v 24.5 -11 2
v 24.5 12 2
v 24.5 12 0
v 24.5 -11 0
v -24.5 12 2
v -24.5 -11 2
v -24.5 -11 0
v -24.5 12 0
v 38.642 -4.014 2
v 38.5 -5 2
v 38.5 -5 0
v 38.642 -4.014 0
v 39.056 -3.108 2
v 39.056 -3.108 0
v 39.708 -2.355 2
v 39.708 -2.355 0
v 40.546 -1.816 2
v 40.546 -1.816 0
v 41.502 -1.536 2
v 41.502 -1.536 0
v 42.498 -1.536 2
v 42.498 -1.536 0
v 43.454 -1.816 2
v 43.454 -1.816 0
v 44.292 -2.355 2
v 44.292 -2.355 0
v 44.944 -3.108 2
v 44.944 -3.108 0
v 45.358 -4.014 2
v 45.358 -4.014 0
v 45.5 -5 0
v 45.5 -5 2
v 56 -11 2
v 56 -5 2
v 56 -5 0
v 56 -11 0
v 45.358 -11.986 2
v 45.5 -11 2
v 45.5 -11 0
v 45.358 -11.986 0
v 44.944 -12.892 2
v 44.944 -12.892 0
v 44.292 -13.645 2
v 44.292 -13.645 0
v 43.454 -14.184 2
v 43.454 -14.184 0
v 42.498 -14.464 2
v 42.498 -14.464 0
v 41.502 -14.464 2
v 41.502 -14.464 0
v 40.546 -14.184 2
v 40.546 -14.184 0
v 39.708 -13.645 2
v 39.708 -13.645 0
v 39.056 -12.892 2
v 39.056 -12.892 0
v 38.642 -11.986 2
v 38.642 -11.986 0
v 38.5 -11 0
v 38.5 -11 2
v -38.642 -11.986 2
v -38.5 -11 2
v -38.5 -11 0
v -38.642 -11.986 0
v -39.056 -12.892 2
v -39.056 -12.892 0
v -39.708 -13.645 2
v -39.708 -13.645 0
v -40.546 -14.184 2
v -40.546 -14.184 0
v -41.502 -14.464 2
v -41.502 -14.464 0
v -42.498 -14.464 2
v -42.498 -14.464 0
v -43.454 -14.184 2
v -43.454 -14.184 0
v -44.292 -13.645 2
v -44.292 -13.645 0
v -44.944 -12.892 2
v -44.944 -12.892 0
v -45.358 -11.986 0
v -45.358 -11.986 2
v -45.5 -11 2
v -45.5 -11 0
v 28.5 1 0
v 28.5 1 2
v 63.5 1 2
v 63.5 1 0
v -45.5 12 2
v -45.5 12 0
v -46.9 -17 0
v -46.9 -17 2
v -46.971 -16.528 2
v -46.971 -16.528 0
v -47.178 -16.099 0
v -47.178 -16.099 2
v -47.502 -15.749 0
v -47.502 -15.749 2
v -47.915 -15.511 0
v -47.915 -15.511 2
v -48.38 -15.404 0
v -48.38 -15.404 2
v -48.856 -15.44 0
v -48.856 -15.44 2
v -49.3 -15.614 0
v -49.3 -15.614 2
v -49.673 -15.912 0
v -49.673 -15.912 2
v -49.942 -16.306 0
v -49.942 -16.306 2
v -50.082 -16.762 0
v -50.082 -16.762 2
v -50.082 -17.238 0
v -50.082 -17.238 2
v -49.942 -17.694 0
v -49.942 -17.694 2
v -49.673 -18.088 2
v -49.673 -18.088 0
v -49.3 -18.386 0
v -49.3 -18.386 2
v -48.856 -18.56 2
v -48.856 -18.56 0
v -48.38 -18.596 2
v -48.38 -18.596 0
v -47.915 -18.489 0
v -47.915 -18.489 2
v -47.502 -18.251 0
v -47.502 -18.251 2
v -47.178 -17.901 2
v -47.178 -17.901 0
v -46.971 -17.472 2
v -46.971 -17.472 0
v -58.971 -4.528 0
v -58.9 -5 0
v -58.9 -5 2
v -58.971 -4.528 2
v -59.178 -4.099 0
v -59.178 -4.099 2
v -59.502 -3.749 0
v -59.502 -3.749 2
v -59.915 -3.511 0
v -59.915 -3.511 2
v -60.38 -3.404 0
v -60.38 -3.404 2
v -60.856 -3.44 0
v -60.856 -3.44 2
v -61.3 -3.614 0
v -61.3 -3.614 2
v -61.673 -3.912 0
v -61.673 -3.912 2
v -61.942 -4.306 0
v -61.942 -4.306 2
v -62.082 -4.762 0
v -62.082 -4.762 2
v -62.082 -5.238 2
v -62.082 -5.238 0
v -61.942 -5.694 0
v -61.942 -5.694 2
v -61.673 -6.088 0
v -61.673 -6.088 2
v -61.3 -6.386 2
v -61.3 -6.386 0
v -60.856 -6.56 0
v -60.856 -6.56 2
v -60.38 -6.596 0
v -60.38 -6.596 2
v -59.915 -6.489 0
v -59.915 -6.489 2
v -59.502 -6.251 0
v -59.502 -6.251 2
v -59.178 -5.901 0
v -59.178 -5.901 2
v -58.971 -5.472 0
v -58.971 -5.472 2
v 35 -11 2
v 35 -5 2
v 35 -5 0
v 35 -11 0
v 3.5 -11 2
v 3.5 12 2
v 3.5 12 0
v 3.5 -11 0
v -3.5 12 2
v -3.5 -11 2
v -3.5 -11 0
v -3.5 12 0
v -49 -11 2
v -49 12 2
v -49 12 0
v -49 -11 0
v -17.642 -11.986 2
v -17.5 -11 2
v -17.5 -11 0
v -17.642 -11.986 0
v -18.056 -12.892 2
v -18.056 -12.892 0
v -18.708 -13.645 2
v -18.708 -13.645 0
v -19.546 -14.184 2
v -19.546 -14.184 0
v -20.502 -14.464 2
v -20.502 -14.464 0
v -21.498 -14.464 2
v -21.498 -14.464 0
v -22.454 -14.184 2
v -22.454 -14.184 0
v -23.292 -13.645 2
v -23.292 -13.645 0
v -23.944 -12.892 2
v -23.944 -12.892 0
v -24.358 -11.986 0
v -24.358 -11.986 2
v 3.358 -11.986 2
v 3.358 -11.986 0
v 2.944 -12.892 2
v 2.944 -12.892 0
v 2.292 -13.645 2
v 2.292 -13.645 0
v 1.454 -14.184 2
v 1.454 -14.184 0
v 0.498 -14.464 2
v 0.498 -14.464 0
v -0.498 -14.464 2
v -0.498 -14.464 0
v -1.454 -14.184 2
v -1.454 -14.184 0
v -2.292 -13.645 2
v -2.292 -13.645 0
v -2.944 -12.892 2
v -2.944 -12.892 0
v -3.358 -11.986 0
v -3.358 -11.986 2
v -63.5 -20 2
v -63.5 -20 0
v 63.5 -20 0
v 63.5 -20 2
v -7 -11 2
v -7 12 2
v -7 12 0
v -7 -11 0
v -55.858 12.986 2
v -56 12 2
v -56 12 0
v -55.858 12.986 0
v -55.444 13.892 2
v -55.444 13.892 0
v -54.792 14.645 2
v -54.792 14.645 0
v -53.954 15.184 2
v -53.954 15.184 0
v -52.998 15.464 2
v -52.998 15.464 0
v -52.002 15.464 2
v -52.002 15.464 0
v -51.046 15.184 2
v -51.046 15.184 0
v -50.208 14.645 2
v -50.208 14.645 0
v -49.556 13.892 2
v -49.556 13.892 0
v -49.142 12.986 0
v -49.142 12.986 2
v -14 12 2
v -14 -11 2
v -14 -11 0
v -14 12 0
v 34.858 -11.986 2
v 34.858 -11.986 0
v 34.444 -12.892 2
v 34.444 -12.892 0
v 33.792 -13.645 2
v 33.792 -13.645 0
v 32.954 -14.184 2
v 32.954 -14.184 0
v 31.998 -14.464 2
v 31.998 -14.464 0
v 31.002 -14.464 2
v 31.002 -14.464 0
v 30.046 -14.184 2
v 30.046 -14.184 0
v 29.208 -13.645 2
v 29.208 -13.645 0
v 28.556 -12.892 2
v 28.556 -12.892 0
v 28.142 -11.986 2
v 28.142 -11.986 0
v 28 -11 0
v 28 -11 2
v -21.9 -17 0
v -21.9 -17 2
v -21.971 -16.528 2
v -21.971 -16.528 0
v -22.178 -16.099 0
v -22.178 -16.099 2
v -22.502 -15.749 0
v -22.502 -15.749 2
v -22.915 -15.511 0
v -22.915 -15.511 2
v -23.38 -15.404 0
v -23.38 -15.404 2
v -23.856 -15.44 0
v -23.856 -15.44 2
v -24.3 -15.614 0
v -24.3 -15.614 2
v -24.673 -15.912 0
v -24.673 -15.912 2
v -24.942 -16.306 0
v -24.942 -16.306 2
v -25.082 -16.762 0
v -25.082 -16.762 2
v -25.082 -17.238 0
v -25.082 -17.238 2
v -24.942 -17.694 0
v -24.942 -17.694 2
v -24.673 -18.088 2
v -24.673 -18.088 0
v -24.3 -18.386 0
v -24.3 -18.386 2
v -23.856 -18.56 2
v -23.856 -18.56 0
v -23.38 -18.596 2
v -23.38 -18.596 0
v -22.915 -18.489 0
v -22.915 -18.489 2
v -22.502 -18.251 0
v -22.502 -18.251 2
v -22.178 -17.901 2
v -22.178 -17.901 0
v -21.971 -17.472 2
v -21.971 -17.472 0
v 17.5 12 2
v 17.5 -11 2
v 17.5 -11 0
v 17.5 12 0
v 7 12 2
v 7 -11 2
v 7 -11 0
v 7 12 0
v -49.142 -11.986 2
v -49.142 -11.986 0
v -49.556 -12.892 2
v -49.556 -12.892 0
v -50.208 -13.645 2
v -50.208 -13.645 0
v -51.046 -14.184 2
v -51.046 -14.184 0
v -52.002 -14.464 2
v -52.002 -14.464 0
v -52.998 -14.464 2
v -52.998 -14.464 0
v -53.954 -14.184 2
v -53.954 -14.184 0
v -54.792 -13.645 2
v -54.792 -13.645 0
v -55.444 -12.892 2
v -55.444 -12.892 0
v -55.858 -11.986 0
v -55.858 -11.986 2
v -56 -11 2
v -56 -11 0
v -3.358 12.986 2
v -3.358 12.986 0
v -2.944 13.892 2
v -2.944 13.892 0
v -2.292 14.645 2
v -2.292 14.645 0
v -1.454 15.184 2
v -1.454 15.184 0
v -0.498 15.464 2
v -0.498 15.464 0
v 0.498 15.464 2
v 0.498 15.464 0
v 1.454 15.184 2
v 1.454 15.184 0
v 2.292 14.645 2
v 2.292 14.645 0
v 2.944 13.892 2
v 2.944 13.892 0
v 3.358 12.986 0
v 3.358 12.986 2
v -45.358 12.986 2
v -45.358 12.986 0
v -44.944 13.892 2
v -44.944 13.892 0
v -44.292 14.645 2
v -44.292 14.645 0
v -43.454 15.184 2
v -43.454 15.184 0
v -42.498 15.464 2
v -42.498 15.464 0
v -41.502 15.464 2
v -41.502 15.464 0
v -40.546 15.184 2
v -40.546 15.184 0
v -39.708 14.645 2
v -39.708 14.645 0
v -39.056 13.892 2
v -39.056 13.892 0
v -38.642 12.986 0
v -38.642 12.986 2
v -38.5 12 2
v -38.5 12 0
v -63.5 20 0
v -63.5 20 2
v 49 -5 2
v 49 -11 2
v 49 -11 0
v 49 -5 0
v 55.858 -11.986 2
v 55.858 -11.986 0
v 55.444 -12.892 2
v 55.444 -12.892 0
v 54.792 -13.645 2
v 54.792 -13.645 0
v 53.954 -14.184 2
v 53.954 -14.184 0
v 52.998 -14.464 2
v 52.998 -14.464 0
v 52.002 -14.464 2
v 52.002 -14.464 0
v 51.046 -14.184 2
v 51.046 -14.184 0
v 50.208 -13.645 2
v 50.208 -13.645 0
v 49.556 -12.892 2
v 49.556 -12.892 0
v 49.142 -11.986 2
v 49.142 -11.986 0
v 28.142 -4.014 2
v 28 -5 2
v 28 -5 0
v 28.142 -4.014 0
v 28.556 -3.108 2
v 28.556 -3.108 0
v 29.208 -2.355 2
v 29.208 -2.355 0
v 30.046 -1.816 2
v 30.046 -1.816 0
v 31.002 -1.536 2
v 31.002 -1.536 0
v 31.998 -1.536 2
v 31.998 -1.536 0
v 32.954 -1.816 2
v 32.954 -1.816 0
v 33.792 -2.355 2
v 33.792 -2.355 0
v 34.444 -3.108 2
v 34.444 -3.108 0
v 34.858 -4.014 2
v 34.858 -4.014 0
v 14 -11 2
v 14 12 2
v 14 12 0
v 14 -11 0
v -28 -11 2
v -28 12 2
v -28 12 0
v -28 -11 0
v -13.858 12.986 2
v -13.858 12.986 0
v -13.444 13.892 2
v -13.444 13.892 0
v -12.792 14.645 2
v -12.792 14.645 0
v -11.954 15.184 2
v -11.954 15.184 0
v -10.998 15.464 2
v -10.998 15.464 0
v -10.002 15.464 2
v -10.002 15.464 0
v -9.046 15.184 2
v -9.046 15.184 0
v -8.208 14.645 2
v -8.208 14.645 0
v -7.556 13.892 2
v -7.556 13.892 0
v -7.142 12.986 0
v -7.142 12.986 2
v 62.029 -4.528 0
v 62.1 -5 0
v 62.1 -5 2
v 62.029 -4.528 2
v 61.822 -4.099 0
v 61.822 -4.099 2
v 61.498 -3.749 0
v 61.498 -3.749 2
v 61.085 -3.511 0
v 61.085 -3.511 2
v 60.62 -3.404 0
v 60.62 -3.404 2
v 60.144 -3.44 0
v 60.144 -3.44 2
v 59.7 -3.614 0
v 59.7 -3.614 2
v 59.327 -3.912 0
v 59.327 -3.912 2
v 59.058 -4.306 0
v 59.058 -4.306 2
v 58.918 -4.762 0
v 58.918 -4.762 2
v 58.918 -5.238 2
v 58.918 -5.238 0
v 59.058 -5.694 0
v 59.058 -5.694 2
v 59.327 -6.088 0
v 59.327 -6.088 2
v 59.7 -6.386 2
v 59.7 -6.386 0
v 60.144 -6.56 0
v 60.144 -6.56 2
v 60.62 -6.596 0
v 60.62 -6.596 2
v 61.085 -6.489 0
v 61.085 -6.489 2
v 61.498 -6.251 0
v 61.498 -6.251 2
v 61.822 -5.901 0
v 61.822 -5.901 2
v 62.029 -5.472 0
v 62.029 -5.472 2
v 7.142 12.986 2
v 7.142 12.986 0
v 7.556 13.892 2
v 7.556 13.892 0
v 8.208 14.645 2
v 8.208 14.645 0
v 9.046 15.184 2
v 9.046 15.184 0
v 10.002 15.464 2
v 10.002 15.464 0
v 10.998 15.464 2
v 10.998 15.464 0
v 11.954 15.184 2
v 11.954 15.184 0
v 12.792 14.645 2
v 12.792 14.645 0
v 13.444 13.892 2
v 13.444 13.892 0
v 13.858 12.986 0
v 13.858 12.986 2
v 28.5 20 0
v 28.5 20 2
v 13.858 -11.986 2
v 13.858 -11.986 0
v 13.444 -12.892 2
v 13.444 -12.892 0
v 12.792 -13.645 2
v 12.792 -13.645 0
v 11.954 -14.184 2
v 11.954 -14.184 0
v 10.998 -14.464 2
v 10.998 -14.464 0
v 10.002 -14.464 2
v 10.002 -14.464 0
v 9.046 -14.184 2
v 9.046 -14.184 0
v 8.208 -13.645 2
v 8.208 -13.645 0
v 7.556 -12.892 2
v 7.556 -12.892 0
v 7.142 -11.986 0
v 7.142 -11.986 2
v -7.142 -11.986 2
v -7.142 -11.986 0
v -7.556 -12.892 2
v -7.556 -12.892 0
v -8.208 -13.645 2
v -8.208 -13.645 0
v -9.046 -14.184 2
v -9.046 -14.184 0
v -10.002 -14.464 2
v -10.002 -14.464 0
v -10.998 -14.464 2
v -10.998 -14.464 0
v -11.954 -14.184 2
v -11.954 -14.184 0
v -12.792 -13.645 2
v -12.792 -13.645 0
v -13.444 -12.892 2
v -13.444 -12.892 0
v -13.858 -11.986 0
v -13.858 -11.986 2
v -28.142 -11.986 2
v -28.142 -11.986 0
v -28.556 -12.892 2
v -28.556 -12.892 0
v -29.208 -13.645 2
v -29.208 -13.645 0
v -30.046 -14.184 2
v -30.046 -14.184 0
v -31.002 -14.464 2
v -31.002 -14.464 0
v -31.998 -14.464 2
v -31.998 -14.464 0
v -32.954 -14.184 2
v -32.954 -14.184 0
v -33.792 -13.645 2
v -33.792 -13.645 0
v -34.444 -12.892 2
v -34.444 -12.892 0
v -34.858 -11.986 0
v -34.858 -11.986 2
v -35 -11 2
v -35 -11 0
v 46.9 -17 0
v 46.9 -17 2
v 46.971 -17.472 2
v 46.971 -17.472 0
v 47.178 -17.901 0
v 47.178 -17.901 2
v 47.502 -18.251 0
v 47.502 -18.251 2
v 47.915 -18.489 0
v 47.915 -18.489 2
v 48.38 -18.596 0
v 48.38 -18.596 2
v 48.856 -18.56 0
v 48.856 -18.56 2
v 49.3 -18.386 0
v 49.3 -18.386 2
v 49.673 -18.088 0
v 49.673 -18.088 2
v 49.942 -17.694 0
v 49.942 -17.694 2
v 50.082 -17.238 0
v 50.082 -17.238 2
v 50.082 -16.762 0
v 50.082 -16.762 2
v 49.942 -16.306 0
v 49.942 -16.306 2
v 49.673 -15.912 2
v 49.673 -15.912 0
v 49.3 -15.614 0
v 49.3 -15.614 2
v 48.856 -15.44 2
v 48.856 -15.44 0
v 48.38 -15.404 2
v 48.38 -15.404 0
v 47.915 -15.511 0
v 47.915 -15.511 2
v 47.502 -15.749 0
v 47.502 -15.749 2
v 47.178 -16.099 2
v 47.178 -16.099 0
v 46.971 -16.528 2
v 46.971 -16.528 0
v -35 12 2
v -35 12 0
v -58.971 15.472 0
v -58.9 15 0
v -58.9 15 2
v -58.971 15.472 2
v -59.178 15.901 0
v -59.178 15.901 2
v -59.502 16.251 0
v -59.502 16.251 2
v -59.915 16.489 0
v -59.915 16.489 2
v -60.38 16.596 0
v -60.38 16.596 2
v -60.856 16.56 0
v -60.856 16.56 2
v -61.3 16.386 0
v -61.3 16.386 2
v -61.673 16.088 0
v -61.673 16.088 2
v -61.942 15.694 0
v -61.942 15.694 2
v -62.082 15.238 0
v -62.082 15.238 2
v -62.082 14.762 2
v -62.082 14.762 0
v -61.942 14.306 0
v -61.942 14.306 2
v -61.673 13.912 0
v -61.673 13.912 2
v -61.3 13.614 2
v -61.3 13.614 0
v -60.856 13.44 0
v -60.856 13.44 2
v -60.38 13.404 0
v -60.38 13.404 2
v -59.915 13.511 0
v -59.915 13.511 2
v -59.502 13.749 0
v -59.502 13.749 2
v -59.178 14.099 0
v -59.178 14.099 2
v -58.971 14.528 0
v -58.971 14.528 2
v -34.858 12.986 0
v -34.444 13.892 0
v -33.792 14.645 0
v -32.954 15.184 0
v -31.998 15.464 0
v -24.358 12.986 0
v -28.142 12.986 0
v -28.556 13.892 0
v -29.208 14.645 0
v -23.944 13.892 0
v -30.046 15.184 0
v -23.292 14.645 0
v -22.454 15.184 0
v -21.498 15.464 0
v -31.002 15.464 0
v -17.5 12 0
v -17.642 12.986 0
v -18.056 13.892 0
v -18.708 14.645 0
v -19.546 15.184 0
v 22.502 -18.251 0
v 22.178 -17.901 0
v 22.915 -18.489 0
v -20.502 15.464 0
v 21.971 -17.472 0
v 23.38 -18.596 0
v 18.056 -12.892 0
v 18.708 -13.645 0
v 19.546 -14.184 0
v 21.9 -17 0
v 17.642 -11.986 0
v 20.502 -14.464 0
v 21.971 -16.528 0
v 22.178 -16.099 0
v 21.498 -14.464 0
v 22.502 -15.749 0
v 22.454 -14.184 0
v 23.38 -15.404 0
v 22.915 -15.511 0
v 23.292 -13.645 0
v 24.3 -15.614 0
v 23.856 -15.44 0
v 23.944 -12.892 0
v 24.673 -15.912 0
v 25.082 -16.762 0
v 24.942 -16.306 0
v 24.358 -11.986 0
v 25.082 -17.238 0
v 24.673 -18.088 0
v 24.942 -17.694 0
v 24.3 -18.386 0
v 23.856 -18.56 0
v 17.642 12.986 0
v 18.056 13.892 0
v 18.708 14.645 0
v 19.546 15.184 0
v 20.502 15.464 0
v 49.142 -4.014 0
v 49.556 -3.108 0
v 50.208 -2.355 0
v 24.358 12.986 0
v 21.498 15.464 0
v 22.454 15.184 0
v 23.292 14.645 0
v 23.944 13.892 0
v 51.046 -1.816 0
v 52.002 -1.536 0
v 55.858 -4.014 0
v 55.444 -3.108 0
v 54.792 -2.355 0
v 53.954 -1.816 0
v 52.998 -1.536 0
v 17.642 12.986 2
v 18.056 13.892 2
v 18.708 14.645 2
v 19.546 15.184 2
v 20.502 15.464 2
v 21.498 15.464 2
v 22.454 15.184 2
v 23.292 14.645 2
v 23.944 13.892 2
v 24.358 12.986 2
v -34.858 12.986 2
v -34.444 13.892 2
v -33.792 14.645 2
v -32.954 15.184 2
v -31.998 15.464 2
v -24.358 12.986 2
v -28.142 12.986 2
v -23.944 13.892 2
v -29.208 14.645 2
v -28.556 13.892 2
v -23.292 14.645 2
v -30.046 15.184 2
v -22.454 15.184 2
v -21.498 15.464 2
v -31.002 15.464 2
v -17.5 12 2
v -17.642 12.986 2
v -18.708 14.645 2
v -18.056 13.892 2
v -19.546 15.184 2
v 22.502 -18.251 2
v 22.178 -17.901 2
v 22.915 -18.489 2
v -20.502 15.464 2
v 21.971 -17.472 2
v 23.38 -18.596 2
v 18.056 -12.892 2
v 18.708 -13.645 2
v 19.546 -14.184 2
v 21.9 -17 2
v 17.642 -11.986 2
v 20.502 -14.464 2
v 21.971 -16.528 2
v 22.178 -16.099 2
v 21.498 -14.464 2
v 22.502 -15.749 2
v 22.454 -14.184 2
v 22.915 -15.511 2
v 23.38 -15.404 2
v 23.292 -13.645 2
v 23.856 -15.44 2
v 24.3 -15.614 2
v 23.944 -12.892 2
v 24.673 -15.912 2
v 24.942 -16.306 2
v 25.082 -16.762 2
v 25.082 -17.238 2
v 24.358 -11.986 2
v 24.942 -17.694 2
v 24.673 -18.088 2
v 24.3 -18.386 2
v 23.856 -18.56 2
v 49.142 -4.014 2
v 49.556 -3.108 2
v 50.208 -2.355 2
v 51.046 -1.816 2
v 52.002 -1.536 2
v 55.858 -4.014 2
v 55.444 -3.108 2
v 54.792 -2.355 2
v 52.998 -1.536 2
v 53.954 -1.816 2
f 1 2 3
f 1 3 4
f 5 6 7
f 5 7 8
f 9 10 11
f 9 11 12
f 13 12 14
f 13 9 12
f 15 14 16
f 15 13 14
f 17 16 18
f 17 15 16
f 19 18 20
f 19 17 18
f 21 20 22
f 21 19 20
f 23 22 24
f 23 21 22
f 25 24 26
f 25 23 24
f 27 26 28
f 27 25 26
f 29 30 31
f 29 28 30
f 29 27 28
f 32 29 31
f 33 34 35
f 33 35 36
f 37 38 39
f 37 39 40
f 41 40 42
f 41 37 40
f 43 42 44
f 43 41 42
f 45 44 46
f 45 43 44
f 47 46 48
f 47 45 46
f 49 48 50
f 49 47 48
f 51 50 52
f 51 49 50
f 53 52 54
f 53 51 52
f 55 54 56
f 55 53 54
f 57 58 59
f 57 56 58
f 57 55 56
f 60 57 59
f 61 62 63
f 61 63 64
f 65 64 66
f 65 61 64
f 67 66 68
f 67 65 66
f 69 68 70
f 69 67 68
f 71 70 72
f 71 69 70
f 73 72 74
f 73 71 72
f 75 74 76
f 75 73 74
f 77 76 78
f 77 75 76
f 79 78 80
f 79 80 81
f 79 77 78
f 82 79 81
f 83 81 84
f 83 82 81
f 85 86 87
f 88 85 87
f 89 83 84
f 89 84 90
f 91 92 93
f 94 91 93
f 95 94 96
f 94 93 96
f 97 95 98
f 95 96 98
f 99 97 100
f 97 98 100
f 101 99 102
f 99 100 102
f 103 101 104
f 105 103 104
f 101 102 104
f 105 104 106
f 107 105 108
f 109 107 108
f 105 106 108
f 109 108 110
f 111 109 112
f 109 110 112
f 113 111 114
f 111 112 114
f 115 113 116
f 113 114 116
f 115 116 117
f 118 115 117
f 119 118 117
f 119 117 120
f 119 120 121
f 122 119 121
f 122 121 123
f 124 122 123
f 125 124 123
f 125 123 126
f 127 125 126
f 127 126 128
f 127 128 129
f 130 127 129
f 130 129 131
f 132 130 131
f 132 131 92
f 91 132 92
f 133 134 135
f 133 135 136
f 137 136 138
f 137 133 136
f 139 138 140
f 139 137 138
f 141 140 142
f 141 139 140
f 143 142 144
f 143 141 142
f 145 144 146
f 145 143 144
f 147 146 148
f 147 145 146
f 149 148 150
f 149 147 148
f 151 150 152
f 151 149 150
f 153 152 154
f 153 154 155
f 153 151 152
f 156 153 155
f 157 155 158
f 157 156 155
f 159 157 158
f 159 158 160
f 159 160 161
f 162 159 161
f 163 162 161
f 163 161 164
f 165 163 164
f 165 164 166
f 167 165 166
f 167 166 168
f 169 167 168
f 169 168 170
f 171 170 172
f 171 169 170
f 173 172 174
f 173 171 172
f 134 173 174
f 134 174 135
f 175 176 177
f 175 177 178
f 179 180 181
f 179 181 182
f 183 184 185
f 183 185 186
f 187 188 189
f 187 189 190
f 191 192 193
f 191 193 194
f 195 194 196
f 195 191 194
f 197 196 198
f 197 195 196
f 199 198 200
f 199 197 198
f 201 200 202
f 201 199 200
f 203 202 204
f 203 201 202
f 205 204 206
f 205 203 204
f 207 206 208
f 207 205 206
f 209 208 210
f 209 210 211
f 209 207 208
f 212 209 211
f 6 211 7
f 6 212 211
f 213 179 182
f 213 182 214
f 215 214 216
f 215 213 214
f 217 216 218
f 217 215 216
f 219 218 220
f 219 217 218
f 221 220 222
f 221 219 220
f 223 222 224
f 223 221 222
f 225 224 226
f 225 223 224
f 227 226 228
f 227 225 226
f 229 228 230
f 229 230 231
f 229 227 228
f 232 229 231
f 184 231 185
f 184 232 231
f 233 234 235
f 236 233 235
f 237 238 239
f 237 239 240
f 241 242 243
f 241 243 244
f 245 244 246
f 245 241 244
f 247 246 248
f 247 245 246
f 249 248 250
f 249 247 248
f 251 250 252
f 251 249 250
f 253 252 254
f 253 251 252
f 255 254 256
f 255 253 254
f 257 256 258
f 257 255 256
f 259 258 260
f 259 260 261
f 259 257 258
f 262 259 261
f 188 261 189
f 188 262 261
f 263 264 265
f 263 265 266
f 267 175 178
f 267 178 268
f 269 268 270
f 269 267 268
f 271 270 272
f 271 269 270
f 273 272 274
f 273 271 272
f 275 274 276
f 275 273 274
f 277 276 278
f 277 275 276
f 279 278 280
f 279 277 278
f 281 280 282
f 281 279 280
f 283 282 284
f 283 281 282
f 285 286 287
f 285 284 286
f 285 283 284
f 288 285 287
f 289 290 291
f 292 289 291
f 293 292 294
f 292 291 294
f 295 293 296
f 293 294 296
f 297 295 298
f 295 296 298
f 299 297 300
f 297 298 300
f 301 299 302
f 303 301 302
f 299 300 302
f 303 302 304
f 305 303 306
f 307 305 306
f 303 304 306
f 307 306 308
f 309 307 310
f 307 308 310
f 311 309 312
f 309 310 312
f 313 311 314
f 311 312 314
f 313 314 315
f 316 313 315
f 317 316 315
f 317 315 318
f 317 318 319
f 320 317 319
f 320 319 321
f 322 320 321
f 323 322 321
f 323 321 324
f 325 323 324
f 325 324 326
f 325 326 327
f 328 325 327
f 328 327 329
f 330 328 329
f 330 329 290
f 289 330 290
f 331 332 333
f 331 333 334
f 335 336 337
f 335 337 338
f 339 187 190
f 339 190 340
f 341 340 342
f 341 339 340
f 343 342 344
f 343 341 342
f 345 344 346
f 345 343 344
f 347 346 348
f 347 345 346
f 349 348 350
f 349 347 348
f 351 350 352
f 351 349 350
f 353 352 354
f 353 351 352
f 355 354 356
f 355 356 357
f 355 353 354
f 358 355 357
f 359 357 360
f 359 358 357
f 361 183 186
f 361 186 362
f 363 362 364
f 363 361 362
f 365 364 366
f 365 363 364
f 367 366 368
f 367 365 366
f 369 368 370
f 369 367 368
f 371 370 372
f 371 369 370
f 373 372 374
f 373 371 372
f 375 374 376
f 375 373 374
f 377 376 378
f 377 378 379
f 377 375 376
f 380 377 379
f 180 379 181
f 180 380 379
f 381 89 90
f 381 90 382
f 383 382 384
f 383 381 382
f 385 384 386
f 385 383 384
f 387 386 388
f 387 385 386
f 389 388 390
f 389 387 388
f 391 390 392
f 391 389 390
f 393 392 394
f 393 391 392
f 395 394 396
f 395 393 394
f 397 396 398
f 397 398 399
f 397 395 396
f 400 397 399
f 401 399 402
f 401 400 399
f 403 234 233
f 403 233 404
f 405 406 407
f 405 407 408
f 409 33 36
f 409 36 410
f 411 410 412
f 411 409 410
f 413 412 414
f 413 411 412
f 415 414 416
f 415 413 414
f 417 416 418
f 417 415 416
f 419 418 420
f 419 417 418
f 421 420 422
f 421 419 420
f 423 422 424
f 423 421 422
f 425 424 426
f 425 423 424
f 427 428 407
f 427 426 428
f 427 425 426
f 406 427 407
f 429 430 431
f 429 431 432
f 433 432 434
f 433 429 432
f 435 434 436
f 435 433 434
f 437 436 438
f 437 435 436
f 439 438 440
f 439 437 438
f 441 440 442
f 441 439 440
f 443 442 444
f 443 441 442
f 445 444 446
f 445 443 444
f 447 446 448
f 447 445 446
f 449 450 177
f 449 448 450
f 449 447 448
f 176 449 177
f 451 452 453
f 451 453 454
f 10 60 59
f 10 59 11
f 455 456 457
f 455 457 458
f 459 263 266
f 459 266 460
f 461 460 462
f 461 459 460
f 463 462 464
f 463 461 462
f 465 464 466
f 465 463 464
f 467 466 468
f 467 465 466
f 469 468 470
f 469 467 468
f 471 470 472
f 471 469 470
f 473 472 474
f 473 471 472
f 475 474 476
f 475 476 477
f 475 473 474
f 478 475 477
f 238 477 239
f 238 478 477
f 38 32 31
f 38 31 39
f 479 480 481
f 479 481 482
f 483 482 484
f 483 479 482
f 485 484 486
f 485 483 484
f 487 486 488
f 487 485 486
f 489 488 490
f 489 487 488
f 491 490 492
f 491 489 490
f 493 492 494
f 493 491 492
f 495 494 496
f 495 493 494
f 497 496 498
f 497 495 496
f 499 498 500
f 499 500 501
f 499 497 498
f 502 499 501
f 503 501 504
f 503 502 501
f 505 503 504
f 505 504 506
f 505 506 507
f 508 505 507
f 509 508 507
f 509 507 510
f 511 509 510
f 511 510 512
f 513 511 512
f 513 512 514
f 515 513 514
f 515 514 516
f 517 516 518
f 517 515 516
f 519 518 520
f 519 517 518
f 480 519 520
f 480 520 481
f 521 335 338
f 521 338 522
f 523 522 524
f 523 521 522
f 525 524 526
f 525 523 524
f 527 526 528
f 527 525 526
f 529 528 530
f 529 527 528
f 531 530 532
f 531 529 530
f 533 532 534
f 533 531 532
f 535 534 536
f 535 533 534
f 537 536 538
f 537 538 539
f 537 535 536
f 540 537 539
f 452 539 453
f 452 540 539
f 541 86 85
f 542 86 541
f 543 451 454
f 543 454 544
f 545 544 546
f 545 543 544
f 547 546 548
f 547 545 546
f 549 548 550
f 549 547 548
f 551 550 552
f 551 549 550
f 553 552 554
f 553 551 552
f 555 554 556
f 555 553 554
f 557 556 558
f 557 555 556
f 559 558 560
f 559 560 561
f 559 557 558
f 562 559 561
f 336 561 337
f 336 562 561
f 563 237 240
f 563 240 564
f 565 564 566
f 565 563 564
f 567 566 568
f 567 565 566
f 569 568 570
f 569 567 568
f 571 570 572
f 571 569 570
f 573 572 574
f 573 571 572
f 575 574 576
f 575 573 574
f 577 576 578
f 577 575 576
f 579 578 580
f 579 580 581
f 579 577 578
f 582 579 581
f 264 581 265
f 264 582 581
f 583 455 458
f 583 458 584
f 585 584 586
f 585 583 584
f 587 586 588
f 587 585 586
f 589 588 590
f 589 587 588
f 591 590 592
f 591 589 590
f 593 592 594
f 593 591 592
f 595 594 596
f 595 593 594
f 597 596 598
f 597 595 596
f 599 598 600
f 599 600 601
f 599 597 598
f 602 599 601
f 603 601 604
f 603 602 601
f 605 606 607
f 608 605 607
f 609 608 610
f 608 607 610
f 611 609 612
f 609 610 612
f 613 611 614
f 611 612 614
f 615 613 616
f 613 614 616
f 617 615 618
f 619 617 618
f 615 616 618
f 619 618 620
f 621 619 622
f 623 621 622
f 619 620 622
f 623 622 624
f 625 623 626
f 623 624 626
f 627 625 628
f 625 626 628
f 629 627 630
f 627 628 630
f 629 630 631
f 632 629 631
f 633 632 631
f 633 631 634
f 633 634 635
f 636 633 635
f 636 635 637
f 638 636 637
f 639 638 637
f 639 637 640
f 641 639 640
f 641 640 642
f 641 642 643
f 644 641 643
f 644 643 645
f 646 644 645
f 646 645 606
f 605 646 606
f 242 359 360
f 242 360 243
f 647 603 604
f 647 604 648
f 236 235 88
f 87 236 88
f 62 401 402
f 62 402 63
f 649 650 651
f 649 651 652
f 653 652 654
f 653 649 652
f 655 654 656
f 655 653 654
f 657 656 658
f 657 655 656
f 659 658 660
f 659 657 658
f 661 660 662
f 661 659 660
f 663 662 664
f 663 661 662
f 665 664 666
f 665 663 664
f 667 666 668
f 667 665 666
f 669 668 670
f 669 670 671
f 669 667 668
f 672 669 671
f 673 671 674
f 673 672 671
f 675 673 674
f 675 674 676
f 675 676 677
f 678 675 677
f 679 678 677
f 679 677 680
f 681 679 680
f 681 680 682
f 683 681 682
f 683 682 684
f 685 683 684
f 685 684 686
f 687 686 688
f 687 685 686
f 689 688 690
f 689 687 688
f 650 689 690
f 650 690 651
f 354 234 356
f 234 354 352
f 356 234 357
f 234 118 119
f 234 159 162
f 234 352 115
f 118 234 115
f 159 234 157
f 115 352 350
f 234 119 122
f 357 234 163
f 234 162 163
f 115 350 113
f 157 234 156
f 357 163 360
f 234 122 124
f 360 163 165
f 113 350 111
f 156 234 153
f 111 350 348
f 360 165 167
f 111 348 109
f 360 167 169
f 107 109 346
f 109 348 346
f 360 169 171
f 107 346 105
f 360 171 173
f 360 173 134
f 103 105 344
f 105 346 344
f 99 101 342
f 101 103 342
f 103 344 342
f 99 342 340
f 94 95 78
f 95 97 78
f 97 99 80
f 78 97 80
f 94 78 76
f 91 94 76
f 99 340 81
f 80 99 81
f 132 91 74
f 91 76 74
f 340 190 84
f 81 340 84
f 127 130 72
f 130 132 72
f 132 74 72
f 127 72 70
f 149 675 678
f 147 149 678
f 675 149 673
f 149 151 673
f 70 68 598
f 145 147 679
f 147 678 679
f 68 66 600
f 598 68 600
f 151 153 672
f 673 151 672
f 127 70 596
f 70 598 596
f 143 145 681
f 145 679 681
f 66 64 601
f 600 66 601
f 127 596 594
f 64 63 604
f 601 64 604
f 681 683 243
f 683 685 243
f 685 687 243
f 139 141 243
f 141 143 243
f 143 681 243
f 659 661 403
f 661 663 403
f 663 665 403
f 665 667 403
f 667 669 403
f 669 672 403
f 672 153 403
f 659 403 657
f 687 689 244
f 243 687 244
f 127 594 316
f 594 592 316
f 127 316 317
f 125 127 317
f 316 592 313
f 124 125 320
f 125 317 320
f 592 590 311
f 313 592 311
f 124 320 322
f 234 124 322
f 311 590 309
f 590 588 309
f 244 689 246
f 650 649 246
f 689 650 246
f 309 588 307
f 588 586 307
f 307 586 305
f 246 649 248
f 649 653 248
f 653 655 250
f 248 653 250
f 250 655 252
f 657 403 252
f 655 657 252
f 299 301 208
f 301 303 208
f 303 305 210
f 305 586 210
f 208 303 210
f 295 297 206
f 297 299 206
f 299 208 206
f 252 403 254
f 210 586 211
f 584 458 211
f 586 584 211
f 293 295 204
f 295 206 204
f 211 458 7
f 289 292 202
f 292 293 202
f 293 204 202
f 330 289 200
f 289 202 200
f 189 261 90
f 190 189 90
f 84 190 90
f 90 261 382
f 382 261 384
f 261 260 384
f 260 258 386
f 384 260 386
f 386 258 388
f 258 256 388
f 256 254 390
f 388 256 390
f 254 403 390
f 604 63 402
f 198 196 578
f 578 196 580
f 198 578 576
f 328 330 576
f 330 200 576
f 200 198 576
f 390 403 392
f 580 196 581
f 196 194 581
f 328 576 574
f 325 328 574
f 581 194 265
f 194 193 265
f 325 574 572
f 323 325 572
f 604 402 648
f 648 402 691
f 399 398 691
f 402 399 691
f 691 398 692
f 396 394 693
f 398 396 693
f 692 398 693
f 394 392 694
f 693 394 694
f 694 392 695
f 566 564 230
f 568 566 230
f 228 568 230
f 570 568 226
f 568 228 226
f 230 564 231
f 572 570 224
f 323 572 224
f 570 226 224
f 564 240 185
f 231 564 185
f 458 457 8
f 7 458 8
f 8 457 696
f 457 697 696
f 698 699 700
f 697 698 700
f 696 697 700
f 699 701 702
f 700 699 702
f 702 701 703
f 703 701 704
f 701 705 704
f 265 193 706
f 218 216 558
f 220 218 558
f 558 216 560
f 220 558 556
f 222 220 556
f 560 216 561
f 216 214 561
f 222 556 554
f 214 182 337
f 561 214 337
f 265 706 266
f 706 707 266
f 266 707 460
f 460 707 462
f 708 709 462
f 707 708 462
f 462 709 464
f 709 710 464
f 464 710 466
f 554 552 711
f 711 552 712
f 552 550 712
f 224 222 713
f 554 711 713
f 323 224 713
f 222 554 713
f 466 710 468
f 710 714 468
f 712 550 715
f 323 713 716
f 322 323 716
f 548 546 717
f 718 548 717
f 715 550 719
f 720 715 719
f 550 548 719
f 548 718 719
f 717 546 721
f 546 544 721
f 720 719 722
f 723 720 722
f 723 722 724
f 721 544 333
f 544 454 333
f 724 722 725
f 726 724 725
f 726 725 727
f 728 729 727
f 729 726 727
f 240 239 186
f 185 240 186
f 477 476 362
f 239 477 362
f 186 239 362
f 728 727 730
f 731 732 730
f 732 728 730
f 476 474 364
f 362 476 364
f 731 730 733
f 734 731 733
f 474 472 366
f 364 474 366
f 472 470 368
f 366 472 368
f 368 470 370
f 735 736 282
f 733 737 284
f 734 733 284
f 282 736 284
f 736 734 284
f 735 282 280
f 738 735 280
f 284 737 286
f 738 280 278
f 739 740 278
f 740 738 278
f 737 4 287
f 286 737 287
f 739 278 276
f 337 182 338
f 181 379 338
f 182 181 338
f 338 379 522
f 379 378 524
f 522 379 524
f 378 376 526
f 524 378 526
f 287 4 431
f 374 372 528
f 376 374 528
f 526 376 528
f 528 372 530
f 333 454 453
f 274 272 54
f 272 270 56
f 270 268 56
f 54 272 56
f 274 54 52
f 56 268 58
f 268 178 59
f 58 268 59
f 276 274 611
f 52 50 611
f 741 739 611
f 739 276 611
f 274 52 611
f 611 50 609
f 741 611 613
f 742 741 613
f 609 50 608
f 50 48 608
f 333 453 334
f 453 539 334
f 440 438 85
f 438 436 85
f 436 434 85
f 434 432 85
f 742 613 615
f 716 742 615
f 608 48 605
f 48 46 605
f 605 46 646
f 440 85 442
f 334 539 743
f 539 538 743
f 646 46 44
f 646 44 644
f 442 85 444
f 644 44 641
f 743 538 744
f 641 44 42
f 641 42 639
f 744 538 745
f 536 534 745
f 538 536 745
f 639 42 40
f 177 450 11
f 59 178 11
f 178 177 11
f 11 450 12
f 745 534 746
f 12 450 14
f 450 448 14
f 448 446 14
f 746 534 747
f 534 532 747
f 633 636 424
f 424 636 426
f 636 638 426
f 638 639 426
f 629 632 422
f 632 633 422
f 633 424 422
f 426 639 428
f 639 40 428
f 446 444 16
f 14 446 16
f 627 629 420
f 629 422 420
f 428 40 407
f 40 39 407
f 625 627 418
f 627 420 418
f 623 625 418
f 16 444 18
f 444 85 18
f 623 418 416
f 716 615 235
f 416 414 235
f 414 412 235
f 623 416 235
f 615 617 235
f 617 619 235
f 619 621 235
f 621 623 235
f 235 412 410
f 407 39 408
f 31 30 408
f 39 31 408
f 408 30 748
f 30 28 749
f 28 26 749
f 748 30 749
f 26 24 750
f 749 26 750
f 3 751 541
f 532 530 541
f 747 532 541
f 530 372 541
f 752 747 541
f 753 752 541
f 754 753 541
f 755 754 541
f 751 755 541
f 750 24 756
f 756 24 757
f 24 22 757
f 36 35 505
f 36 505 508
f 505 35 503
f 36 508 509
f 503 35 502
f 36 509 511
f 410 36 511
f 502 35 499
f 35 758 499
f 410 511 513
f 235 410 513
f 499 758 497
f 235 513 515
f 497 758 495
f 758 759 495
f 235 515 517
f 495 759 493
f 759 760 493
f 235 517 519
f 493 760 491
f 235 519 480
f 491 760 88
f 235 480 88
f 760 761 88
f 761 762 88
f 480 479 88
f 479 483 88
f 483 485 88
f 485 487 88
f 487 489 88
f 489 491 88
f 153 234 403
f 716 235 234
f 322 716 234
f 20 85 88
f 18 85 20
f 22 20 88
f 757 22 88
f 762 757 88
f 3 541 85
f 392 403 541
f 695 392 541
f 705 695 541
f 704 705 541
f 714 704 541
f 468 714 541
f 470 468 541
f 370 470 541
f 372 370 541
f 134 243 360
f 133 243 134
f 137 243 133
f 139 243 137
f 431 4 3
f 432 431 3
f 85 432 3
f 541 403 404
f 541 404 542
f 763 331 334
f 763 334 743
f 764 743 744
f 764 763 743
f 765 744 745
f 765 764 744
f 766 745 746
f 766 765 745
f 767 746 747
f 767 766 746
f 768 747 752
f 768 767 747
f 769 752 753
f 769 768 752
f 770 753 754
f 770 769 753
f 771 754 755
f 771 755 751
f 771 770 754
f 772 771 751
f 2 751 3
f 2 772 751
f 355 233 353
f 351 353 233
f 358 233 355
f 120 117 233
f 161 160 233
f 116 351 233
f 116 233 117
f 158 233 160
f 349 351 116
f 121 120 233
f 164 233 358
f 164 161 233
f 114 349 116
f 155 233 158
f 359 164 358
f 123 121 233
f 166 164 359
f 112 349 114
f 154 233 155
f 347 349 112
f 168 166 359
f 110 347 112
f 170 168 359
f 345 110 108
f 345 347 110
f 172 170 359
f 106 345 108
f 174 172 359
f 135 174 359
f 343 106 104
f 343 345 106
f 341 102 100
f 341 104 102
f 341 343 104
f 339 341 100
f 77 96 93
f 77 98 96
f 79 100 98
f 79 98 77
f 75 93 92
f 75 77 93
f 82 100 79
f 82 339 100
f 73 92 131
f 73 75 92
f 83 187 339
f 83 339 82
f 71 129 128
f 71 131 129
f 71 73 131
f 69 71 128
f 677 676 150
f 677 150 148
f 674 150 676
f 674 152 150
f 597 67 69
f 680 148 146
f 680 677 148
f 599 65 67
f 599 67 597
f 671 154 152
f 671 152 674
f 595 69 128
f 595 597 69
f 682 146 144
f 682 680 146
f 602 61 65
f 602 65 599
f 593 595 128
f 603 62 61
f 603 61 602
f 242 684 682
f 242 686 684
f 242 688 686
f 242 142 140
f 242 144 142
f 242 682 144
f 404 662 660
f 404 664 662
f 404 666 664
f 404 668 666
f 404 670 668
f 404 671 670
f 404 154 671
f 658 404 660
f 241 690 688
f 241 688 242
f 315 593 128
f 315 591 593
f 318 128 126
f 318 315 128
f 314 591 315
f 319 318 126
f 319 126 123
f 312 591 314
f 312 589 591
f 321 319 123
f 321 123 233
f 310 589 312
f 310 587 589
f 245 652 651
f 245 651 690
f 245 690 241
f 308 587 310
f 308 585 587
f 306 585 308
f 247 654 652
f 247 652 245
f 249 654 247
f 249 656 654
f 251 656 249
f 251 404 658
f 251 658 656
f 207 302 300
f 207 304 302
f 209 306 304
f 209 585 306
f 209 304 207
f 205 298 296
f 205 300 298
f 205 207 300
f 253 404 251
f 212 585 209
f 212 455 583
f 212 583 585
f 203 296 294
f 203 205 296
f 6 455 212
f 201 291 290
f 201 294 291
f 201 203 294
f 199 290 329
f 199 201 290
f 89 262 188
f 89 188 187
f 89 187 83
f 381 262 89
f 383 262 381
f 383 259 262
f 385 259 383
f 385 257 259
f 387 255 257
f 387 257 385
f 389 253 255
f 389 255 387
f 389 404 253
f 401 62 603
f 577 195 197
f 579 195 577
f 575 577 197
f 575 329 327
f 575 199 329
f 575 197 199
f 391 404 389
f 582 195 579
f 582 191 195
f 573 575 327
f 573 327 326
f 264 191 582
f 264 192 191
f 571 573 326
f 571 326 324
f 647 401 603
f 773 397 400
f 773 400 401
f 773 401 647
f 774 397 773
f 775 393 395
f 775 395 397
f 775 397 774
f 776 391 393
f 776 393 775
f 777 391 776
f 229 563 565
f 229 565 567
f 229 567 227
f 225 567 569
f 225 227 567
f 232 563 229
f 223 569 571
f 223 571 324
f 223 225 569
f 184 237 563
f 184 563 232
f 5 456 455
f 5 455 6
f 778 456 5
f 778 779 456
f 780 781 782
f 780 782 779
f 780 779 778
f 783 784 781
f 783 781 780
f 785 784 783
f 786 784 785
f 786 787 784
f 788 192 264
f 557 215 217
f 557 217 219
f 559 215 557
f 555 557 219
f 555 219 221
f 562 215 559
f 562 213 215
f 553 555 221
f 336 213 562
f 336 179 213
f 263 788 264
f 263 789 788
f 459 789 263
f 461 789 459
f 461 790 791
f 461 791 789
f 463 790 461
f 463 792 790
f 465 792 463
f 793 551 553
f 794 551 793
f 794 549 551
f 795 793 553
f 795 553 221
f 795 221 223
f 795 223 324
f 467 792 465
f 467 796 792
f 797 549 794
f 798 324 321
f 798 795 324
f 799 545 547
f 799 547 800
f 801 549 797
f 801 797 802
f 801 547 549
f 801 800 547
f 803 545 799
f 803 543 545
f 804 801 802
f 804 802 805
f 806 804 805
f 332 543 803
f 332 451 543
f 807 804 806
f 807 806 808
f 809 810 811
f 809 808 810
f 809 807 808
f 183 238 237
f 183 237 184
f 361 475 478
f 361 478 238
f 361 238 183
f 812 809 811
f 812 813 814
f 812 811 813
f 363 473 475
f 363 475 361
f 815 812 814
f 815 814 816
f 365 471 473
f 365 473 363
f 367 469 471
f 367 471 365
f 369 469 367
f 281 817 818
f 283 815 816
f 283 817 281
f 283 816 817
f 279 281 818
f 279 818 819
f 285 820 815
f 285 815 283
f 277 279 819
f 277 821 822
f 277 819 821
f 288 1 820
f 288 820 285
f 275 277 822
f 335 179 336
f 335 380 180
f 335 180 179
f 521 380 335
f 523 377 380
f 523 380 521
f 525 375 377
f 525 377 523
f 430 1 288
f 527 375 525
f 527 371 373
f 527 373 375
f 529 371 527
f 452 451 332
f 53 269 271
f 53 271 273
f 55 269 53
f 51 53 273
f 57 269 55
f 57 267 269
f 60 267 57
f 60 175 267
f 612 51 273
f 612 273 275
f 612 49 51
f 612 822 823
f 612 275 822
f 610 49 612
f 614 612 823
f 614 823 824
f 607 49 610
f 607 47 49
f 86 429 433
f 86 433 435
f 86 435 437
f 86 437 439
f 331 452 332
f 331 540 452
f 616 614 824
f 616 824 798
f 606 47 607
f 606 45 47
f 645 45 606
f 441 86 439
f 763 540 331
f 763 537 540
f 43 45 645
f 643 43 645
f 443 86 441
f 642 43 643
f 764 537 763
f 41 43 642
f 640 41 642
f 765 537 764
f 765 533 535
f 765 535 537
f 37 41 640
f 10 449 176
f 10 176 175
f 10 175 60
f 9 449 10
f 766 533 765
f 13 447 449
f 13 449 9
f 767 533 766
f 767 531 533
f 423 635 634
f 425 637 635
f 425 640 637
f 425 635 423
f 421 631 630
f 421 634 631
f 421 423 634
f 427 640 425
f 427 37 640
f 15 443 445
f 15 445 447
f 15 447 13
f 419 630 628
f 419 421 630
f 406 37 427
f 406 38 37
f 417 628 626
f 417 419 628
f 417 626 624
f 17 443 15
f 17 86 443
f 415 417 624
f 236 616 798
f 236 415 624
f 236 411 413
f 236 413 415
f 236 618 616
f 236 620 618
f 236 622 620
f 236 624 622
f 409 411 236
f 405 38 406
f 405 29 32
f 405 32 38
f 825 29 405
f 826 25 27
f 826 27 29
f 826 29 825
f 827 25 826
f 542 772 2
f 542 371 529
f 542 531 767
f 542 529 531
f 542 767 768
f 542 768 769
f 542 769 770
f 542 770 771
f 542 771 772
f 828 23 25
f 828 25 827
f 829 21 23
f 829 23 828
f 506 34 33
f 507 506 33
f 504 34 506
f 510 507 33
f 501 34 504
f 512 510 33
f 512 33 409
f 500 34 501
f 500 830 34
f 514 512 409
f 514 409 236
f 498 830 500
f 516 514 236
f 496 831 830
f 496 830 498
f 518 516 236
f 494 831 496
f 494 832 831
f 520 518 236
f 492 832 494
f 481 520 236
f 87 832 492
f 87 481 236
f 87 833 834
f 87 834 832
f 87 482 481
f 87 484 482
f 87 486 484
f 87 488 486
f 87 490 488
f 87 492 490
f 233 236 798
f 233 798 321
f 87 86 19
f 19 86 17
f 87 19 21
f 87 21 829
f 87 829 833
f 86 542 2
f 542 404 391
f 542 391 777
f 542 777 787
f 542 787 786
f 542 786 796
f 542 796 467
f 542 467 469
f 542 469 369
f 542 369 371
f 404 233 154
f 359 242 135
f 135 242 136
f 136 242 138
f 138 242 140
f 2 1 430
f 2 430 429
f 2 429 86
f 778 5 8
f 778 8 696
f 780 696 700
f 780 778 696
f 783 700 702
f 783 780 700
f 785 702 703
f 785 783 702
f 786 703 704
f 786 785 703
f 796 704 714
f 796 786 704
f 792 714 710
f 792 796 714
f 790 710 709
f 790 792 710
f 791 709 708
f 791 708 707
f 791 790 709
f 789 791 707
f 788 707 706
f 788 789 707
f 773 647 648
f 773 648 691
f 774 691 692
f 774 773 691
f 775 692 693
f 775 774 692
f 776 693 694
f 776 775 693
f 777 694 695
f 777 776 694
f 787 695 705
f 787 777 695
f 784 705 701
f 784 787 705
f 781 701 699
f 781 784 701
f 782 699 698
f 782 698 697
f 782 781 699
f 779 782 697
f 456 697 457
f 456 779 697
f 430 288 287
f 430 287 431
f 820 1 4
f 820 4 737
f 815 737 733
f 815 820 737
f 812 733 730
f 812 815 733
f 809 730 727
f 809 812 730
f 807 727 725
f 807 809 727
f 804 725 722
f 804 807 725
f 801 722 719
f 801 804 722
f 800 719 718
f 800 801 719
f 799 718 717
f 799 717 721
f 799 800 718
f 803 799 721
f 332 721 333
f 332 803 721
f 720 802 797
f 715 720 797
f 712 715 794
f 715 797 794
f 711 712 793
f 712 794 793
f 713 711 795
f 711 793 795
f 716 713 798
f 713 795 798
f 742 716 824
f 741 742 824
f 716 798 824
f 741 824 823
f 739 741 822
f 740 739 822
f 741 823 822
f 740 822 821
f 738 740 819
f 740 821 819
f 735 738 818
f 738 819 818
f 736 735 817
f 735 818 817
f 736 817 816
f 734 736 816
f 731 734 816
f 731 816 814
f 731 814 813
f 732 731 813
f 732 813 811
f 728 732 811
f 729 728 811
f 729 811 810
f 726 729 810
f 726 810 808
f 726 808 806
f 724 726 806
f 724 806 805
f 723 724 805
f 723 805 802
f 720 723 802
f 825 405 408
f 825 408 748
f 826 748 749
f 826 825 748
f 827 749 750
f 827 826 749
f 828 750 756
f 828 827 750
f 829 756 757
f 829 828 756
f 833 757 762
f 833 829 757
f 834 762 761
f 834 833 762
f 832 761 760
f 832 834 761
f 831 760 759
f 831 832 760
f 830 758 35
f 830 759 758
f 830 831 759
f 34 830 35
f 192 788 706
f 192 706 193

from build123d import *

# Parameters (mm, degrees)
SKETCH_1_W          = 6
SKETCH_1_H          = 40
SKETCH_1_R          = 1.6
SKETCH_1_W_2        = 115
EXTRUDE_1_DEPTH     = 2
CUT_EXTRUDE_1_DEPTH = 2
SKETCH_3_R          = 1.6
CUT_EXTRUDE_2_DEPTH = 67.605179979
CUT_EXTRUDE_3_DEPTH = 67.605179979
CUT_EXTRUDE_4_DEPTH = 67.605179979
SKETCH_6_W          = 35
SKETCH_6_H          = 19
CUT_EXTRUDE_5_DEPTH = 67.605179979


with BuildPart() as part:
    # 草图1 → 凸台-拉伸1 (new body)
    # profile 1 of 3: a face of its own
    with BuildSketch(Plane.XY):
        with Locations((-60.5, 0)):
            Rectangle(SKETCH_1_W, SKETCH_1_H)
        with Locations((-60.5, -5)):
            Circle(SKETCH_1_R, mode=Mode.SUBTRACT)
        with Locations((-60.5, 15)):
            Circle(SKETCH_1_R, mode=Mode.SUBTRACT)
    # profile 2 of 3: a face of its own
    with BuildSketch(Plane.XY):
        Rectangle(SKETCH_1_W_2, SKETCH_1_H)
    # profile 3 of 3: a face of its own
    with BuildSketch(Plane.XY):
        with Locations((60.5, 0)):
            Rectangle(SKETCH_1_W, SKETCH_1_H)
        with Locations((60.5, -5)):
            Circle(SKETCH_1_R, mode=Mode.SUBTRACT)
        with Locations((60.5, 15)):
            Circle(SKETCH_1_R, mode=Mode.SUBTRACT)
    extrude(amount=EXTRUDE_1_DEPTH)

    # 草图2 → 切除-拉伸1 (cut)
    with BuildSketch(Plane.XY.offset(2)):
        with BuildLine():
            Line((3.5, 12), (3.5, -11))
            ThreePointArc((3.5, -11), (0, -14.5), (-3.5, -11))
            Line((-3.5, -11), (-3.5, 12))
            ThreePointArc((-3.5, 12), (0, 15.5), (3.5, 12))
        make_face()
        with BuildLine():
            Line((14, 12), (14, -11))
            ThreePointArc((14, -11), (10.5, -14.5), (7, -11))
            Line((7, -11), (7, 12))
            ThreePointArc((7, 12), (10.5, 15.5), (14, 12))
        make_face()
        with BuildLine():
            Line((24.5, 12), (24.5, -11))
            ThreePointArc((24.5, -11), (21, -14.5), (17.5, -11))
            Line((17.5, -11), (17.5, 12))
            ThreePointArc((17.5, 12), (21, 15.5), (24.5, 12))
        make_face()
        with BuildLine():
            Line((-7, 12), (-7, -11))
            ThreePointArc((-7, -11), (-10.5, -14.5), (-14, -11))
            Line((-14, -11), (-14, 12))
            ThreePointArc((-14, 12), (-10.5, 15.5), (-7, 12))
        make_face()
        with BuildLine():
            Line((-17.5, 12), (-17.5, -11))
            ThreePointArc((-17.5, -11), (-21, -14.5), (-24.5, -11))
            Line((-24.5, -11), (-24.5, 12))
            ThreePointArc((-24.5, 12), (-21, 15.5), (-17.5, 12))
        make_face()
        with BuildLine():
            Line((-28, 12), (-28, -11))
            ThreePointArc((-28, -11), (-31.5, -14.5), (-35, -11))
            Line((-35, -11), (-35, 12))
            ThreePointArc((-35, 12), (-31.5, 15.5), (-28, 12))
        make_face()
        with BuildLine():
            Line((-38.5, 12), (-38.5, -11))
            ThreePointArc((-38.5, -11), (-42, -14.5), (-45.5, -11))
            Line((-45.5, -11), (-45.5, 12))
            ThreePointArc((-45.5, 12), (-42, 15.5), (-38.5, 12))
        make_face()
        with BuildLine():
            Line((-49, 12), (-49, -11))
            ThreePointArc((-49, -11), (-52.5, -14.5), (-56, -11))
            Line((-56, -11), (-56, 12))
            ThreePointArc((-56, 12), (-52.5, 15.5), (-49, 12))
        make_face()
    extrude(amount=-CUT_EXTRUDE_1_DEPTH, mode=Mode.SUBTRACT)

    # 草图3 → 切除-拉伸2 (cut, through all)
    with BuildSketch(Plane.XY.offset(2)):
        with Locations((-48.5, -17)):
            Circle(SKETCH_3_R)
        with Locations((-23.5, -17)):
            Circle(SKETCH_3_R)
        with Locations(Location((23.5, -17, 0), (0, 0, 180))):
            Circle(SKETCH_3_R)
        with Locations(Location((48.5, -17, 0), (0, 0, 180))):
            Circle(SKETCH_3_R)
    extrude(amount=-CUT_EXTRUDE_2_DEPTH, mode=Mode.SUBTRACT)

    # 草图4 → 切除-拉伸3 (cut, through all)
    with BuildSketch(Plane.XY.offset(2)):
        with BuildLine():
            Line((63.5, 5.4), (33.5, 5.4))
            ThreePointArc((33.5, 5.4), (32.5, 4.4), (31.5, 5.4))
            Line((31.5, 5.4), (31.5, 11.4))
            ThreePointArc((31.5, 11.4), (32.5, 12.4), (33.5, 11.4))
            Line((33.5, 11.4), (63.5, 11.4))
            Line((63.5, 11.4), (63.5, 5.4))
        make_face()
    extrude(amount=-CUT_EXTRUDE_3_DEPTH, mode=Mode.SUBTRACT)

    # 草图5 → 切除-拉伸4 (cut, through all)
    with BuildSketch(Plane.XY.offset(2)):
        with BuildLine():
            Line((35, -5), (35, -11))
            ThreePointArc((35, -11), (31.5, -14.5), (28, -11))
            Line((28, -11), (28, -5))
            ThreePointArc((28, -5), (31.5, -1.5), (35, -5))
        make_face()
        with BuildLine():
            Line((45.5, -5), (45.5, -11))
            ThreePointArc((45.5, -11), (42, -14.5), (38.5, -11))
            Line((38.5, -11), (38.5, -5))
            ThreePointArc((38.5, -5), (42, -1.5), (45.5, -5))
        make_face()
        with BuildLine():
            Line((56, -5), (56, -11))
            ThreePointArc((56, -11), (52.5, -14.5), (49, -11))
            Line((49, -11), (49, -5))
            ThreePointArc((49, -5), (52.5, -1.5), (56, -5))
        make_face()
    extrude(amount=-CUT_EXTRUDE_4_DEPTH, mode=Mode.SUBTRACT)

    # 草图6 → 切除-拉伸5 (cut, through all)
    with BuildSketch(Plane.XY.offset(2)):
        with Locations((46, 10.5)):
            Rectangle(SKETCH_6_W, SKETCH_6_H)
    extrude(amount=-CUT_EXTRUDE_5_DEPTH, mode=Mode.SUBTRACT)


solid = part.part
